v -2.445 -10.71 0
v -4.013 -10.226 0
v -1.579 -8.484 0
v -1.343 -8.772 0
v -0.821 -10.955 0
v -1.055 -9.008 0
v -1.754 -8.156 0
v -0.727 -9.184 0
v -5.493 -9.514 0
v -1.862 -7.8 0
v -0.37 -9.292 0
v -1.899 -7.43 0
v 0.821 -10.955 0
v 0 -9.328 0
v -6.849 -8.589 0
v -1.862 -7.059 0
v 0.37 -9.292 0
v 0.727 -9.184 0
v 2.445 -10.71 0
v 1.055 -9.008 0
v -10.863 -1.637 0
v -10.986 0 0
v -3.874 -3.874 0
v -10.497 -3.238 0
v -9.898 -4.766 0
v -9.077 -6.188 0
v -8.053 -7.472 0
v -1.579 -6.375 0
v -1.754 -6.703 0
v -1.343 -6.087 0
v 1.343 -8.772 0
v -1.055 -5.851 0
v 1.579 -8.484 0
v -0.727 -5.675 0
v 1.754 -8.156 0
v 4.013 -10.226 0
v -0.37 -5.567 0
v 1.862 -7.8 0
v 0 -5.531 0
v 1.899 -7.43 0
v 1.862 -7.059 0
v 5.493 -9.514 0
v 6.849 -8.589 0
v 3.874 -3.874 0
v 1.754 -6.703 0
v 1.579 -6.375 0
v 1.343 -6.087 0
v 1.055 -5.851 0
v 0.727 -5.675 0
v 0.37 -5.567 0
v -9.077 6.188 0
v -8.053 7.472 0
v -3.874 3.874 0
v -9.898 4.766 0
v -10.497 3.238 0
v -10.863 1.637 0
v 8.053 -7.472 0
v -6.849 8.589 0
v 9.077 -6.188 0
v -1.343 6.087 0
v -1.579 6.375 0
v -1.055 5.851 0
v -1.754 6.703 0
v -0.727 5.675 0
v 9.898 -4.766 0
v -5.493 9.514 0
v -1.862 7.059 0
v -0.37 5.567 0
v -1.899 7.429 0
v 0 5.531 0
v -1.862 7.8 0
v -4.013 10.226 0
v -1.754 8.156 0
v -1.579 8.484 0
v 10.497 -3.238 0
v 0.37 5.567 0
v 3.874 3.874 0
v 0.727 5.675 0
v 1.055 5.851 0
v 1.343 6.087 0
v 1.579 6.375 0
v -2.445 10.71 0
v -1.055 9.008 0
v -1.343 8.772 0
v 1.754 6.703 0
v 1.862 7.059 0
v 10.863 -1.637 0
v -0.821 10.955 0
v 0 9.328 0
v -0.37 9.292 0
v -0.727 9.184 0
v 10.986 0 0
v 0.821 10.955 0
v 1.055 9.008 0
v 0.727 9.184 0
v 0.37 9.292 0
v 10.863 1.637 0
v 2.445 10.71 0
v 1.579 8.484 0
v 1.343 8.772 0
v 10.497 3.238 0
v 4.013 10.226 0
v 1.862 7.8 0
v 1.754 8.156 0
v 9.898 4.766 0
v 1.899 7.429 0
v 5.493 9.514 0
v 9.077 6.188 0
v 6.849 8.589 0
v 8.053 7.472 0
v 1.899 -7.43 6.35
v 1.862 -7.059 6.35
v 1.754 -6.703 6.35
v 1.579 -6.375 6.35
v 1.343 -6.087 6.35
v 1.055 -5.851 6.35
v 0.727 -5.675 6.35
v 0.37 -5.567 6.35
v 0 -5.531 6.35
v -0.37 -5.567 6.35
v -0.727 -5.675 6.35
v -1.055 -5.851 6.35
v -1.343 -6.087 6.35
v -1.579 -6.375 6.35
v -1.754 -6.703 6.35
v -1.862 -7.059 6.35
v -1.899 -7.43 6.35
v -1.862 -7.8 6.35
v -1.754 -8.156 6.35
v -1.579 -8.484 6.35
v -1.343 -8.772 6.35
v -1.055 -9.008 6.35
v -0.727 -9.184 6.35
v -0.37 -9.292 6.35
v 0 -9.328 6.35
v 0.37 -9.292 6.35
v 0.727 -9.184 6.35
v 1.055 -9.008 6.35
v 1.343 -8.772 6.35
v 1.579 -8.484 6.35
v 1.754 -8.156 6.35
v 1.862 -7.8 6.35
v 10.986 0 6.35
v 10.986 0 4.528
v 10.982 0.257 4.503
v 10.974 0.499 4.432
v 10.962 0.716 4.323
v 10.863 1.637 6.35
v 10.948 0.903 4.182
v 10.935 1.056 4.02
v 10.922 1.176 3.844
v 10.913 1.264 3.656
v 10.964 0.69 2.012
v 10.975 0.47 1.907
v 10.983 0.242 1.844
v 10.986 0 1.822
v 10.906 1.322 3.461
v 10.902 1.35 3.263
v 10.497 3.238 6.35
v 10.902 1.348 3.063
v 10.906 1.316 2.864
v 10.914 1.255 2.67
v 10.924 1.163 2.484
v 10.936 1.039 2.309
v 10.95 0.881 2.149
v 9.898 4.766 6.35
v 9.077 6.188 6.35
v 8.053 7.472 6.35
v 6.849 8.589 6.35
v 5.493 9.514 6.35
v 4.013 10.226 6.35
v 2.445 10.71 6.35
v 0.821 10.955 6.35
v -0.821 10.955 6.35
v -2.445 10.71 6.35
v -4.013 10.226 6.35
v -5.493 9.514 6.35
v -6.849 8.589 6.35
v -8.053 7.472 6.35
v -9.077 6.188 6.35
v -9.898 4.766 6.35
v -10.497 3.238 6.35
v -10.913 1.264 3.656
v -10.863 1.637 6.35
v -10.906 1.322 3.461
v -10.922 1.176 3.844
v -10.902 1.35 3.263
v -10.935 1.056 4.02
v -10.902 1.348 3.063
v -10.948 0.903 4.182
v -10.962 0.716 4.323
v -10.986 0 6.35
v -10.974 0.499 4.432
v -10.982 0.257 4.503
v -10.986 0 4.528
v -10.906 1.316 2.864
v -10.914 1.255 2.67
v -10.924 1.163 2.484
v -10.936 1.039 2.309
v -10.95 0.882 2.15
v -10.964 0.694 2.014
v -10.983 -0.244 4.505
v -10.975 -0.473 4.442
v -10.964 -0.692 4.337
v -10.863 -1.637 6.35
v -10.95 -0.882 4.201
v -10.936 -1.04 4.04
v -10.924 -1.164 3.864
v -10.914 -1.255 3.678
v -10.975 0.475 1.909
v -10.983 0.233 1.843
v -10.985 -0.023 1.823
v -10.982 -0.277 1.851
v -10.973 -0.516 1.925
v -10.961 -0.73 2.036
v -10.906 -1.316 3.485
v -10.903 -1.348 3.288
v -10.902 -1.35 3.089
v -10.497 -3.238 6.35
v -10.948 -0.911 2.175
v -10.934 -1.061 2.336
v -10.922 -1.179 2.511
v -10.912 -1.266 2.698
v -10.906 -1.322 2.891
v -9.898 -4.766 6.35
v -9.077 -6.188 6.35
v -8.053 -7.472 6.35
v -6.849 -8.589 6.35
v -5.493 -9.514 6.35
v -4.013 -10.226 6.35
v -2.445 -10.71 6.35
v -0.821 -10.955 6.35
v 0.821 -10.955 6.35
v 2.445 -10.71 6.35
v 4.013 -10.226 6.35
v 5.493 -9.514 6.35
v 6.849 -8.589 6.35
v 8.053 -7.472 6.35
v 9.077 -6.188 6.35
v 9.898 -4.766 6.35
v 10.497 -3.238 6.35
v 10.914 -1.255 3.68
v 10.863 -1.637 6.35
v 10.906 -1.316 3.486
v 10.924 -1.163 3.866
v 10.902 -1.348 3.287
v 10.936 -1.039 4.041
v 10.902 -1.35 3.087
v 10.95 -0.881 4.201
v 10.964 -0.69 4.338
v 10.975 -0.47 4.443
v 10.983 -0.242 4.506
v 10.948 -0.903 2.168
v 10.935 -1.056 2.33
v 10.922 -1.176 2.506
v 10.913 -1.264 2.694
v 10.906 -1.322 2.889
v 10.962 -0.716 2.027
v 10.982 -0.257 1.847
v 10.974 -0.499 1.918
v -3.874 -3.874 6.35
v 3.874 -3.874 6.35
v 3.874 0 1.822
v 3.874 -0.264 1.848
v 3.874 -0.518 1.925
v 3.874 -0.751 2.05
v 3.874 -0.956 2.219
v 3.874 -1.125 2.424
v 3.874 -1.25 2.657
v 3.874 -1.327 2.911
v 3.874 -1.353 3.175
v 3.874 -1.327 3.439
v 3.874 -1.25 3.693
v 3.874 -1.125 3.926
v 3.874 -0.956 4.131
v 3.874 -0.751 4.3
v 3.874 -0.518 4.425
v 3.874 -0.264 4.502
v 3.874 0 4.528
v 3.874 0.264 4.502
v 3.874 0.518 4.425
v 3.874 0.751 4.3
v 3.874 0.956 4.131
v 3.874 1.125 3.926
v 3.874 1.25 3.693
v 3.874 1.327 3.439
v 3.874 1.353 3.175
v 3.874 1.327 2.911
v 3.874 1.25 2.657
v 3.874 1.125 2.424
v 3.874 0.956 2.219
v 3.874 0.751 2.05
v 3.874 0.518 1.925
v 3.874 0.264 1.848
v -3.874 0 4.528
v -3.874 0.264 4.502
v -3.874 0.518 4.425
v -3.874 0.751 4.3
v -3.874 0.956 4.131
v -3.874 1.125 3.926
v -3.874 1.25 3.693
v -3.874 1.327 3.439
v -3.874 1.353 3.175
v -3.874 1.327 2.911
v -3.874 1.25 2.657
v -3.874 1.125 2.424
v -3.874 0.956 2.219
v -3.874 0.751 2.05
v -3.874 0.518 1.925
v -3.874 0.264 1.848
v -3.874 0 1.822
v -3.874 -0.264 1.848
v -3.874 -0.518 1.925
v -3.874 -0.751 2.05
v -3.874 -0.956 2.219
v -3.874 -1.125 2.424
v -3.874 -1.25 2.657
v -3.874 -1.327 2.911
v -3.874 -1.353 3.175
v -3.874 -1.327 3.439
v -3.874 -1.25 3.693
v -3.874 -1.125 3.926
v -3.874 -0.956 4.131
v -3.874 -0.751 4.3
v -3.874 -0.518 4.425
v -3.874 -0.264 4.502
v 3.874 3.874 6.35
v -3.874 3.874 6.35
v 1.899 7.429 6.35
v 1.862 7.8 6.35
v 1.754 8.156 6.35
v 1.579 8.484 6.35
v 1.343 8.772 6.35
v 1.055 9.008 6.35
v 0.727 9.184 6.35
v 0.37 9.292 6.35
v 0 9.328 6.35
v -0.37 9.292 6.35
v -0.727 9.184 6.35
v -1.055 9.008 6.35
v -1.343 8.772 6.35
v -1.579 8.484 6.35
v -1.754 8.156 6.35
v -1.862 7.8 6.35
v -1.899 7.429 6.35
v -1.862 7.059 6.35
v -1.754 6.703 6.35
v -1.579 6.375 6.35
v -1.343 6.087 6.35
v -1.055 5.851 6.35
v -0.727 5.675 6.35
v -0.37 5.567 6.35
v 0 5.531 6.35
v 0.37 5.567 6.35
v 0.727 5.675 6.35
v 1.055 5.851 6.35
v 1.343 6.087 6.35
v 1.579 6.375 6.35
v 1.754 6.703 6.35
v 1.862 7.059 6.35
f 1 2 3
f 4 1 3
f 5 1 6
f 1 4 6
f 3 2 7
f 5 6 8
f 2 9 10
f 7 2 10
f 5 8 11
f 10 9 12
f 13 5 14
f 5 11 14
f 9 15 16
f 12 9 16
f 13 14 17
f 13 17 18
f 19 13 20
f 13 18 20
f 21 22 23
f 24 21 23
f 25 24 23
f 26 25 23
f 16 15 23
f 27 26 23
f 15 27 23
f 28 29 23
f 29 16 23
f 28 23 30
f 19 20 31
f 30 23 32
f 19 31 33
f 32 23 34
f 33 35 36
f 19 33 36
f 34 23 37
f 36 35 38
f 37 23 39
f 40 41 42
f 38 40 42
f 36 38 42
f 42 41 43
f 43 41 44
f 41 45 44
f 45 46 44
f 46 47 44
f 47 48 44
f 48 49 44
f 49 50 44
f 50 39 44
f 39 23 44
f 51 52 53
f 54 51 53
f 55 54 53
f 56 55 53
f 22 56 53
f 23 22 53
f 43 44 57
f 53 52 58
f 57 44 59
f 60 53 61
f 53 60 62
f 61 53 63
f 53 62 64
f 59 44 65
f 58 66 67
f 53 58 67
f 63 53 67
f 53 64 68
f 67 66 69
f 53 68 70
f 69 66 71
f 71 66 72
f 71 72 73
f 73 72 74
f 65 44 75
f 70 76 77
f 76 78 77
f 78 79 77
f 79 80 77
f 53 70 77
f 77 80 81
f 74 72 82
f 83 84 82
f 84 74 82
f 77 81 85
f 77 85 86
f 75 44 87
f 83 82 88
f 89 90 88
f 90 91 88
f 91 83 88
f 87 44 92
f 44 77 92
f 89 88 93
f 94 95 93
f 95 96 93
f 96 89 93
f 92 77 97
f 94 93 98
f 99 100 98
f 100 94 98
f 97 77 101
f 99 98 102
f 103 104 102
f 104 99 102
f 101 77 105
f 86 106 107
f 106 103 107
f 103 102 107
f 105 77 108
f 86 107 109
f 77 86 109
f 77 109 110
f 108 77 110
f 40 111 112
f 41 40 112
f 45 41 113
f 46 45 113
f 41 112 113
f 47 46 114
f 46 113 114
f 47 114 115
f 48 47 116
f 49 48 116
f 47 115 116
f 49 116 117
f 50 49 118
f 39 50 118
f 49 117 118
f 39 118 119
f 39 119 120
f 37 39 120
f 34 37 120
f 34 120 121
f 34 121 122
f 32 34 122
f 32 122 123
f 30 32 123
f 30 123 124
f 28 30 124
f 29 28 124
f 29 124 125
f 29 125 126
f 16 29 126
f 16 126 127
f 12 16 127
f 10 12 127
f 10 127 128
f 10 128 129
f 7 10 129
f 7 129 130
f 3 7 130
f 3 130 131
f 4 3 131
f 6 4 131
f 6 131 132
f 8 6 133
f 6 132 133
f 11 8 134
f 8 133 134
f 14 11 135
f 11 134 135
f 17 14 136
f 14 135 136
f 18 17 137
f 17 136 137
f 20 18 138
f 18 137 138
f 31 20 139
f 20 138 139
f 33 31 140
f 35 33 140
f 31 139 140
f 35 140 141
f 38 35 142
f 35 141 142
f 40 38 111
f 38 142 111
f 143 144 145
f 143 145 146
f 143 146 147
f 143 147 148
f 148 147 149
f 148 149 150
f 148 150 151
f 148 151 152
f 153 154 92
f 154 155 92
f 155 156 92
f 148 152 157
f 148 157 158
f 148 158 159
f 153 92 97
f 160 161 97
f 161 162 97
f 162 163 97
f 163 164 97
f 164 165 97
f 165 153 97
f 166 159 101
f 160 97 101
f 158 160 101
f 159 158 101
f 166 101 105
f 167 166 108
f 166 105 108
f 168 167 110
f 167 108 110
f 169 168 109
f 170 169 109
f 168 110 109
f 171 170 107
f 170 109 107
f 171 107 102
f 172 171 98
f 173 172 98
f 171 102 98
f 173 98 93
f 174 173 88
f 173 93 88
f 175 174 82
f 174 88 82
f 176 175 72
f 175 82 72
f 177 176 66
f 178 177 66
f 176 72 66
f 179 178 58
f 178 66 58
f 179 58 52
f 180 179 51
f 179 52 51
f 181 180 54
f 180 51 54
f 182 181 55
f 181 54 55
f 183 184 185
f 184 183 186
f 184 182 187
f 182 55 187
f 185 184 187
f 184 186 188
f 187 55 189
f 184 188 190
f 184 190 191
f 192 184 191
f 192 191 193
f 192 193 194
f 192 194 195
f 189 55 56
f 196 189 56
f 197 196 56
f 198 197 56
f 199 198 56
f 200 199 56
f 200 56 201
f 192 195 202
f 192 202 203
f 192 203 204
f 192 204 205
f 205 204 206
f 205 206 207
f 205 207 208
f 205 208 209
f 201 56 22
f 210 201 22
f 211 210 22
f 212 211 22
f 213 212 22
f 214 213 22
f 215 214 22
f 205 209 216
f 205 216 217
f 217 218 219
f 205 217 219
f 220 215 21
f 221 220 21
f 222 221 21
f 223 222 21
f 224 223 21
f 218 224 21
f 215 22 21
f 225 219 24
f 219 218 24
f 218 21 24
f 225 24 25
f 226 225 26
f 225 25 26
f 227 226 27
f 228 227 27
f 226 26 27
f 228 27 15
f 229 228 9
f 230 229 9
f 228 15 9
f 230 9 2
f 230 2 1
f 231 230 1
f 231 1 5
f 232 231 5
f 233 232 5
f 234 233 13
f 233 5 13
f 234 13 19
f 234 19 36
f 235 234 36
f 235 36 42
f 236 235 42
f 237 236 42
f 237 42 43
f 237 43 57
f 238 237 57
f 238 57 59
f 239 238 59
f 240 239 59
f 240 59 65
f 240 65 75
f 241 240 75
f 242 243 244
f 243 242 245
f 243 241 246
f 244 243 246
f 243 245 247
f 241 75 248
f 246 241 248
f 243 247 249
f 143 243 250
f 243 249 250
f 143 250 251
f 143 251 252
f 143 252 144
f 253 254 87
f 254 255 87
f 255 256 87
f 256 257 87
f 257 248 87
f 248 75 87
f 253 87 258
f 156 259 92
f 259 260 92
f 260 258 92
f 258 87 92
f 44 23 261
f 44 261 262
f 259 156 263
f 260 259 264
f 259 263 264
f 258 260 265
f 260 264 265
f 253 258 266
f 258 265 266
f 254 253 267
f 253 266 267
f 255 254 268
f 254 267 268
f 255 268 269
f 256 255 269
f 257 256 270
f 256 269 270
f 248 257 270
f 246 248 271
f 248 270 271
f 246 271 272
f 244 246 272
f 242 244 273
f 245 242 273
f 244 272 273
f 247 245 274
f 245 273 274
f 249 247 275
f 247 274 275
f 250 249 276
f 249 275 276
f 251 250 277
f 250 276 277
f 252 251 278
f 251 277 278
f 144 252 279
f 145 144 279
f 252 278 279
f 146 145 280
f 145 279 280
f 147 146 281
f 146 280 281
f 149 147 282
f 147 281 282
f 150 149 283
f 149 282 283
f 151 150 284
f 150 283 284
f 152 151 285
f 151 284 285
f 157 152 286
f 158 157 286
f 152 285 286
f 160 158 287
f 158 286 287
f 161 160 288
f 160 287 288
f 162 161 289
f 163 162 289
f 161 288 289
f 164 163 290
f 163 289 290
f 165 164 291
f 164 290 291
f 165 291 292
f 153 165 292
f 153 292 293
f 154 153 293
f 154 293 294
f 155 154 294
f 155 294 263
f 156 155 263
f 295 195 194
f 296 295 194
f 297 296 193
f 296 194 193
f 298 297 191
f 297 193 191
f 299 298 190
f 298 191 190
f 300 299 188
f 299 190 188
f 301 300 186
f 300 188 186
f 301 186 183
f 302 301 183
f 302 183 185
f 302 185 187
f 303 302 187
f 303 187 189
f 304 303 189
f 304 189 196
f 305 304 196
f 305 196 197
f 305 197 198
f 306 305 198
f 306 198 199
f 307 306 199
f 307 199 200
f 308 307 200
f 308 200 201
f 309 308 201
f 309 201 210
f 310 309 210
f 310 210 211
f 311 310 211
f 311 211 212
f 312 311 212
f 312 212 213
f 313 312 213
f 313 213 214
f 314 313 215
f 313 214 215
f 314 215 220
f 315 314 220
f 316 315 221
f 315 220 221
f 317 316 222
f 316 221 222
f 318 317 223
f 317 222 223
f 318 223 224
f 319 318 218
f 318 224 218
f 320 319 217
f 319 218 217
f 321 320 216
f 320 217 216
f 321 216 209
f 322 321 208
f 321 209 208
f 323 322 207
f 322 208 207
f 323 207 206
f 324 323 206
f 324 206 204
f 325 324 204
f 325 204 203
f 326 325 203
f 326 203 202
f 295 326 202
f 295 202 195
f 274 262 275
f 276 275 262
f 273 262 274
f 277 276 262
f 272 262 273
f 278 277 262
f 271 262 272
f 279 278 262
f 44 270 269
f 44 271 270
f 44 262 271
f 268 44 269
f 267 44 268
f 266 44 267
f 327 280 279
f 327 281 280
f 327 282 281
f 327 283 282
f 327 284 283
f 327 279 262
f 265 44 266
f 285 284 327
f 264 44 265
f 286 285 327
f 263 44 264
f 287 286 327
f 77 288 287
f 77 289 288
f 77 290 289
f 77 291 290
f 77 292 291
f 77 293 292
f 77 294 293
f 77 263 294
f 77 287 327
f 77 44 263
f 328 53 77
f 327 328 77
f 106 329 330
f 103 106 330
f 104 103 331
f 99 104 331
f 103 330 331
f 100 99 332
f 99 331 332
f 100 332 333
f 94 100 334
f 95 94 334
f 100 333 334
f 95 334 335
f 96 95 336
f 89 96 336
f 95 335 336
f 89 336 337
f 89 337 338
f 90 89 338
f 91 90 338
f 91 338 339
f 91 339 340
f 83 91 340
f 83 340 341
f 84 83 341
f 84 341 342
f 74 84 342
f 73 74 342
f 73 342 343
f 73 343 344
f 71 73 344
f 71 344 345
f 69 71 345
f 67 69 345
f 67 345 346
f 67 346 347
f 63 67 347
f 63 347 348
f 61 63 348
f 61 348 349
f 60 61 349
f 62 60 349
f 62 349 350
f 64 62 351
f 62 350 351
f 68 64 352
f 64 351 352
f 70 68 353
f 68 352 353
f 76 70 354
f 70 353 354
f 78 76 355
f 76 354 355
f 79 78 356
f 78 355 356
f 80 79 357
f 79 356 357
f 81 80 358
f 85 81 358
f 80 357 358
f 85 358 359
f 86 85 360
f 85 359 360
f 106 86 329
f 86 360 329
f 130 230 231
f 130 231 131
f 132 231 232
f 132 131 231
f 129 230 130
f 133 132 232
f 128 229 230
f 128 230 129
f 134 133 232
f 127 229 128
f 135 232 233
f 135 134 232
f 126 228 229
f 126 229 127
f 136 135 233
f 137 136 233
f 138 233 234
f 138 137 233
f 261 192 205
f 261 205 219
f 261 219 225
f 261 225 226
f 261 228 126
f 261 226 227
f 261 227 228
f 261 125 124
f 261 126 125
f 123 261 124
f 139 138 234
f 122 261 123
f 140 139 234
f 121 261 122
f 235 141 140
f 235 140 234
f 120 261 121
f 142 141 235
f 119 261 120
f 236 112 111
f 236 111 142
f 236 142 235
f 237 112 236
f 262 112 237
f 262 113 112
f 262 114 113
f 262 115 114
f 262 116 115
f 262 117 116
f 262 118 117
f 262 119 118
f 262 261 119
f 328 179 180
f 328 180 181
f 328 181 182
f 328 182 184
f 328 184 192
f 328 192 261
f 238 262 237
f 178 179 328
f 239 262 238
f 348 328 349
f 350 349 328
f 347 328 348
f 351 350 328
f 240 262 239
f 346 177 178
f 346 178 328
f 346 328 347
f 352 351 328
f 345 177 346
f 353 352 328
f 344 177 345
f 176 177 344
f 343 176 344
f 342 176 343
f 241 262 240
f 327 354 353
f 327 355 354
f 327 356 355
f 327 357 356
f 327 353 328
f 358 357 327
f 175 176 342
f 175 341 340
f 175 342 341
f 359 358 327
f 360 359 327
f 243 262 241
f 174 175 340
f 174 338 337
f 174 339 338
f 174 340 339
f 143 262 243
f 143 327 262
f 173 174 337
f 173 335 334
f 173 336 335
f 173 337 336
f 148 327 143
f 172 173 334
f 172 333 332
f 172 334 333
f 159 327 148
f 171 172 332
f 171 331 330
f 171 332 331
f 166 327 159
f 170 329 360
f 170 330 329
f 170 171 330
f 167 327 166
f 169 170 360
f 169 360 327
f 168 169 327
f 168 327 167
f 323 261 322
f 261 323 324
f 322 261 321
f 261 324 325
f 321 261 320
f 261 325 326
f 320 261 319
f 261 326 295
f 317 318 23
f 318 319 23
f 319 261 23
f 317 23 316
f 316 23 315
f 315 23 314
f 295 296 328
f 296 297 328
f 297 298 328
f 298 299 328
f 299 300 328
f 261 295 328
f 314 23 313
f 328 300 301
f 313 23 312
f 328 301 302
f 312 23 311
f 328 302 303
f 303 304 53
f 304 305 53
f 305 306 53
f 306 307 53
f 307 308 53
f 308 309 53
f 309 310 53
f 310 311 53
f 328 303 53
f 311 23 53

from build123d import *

# Parameters (mm, degrees)
SKETCH1_R                           = 10.9855
SKETCH1_W                           = 7.747
SKETCH1_H                           = 7.747
BOSS_EXTRUDE1_DEPTH                 = 6.35
F_6_32_TAPPED_HOLE1_D               = 2.7051
F_6_32_TAPPED_HOLE1_DEPTH           = 7.112
F_6_32_TAPPED_HOLE1_ON_FACE_2_D     = 2.7051
F_6_32_TAPPED_HOLE1_ON_FACE_2_DEPTH = 7.112
F_6_32_TAPPED_HOLE2_D               = 2.7051
F_6_CLEARANCE_HOLE1_D               = 3.7973


with BuildPart() as part:
    # Sketch1 → Boss-Extrude1 (new body)
    with BuildSketch(Plane.XY):
        Circle(SKETCH1_R)
        Rectangle(SKETCH1_W, SKETCH1_H, mode=Mode.SUBTRACT)
    extrude(amount=BOSS_EXTRUDE1_DEPTH)

    # #6-32 Tapped Hole1
    with Locations(Plane(origin=(10.9855, 0, 3.175), x_dir=(0, 0, 1), z_dir=(1, 0, 0))):
        with Locations((0, 0)):
            Hole(F_6_32_TAPPED_HOLE1_D / 2, depth=F_6_32_TAPPED_HOLE1_DEPTH)

    # #6-32 Tapped Hole1 on face 2
    with Locations(Plane(origin=(3.8735, 0, 3.175), x_dir=(0, 0, -1), z_dir=(-1, 0, 0))):
        with Locations((0, 0)):
            Hole(F_6_32_TAPPED_HOLE1_ON_FACE_2_D / 2, depth=F_6_32_TAPPED_HOLE1_ON_FACE_2_DEPTH)

    # #6-32 Tapped Hole2 (through all)
    with Locations(Plane(origin=(-3.8735, 0, 0), x_dir=(0, 0, -1), z_dir=(1, 0, 0))):
        with Locations((-3.175, 0)):
            Hole(F_6_32_TAPPED_HOLE2_D / 2)

    # #6 Clearance Hole1 (through all)
    with Locations(Plane(origin=(0, 0, 0), x_dir=(-1, 0, 0), z_dir=(0, 0, -1))):
        with Locations((0, -7.4295), (0, 7.4295)):
            Hole(F_6_CLEARANCE_HOLE1_D / 2)


solid = part.part
